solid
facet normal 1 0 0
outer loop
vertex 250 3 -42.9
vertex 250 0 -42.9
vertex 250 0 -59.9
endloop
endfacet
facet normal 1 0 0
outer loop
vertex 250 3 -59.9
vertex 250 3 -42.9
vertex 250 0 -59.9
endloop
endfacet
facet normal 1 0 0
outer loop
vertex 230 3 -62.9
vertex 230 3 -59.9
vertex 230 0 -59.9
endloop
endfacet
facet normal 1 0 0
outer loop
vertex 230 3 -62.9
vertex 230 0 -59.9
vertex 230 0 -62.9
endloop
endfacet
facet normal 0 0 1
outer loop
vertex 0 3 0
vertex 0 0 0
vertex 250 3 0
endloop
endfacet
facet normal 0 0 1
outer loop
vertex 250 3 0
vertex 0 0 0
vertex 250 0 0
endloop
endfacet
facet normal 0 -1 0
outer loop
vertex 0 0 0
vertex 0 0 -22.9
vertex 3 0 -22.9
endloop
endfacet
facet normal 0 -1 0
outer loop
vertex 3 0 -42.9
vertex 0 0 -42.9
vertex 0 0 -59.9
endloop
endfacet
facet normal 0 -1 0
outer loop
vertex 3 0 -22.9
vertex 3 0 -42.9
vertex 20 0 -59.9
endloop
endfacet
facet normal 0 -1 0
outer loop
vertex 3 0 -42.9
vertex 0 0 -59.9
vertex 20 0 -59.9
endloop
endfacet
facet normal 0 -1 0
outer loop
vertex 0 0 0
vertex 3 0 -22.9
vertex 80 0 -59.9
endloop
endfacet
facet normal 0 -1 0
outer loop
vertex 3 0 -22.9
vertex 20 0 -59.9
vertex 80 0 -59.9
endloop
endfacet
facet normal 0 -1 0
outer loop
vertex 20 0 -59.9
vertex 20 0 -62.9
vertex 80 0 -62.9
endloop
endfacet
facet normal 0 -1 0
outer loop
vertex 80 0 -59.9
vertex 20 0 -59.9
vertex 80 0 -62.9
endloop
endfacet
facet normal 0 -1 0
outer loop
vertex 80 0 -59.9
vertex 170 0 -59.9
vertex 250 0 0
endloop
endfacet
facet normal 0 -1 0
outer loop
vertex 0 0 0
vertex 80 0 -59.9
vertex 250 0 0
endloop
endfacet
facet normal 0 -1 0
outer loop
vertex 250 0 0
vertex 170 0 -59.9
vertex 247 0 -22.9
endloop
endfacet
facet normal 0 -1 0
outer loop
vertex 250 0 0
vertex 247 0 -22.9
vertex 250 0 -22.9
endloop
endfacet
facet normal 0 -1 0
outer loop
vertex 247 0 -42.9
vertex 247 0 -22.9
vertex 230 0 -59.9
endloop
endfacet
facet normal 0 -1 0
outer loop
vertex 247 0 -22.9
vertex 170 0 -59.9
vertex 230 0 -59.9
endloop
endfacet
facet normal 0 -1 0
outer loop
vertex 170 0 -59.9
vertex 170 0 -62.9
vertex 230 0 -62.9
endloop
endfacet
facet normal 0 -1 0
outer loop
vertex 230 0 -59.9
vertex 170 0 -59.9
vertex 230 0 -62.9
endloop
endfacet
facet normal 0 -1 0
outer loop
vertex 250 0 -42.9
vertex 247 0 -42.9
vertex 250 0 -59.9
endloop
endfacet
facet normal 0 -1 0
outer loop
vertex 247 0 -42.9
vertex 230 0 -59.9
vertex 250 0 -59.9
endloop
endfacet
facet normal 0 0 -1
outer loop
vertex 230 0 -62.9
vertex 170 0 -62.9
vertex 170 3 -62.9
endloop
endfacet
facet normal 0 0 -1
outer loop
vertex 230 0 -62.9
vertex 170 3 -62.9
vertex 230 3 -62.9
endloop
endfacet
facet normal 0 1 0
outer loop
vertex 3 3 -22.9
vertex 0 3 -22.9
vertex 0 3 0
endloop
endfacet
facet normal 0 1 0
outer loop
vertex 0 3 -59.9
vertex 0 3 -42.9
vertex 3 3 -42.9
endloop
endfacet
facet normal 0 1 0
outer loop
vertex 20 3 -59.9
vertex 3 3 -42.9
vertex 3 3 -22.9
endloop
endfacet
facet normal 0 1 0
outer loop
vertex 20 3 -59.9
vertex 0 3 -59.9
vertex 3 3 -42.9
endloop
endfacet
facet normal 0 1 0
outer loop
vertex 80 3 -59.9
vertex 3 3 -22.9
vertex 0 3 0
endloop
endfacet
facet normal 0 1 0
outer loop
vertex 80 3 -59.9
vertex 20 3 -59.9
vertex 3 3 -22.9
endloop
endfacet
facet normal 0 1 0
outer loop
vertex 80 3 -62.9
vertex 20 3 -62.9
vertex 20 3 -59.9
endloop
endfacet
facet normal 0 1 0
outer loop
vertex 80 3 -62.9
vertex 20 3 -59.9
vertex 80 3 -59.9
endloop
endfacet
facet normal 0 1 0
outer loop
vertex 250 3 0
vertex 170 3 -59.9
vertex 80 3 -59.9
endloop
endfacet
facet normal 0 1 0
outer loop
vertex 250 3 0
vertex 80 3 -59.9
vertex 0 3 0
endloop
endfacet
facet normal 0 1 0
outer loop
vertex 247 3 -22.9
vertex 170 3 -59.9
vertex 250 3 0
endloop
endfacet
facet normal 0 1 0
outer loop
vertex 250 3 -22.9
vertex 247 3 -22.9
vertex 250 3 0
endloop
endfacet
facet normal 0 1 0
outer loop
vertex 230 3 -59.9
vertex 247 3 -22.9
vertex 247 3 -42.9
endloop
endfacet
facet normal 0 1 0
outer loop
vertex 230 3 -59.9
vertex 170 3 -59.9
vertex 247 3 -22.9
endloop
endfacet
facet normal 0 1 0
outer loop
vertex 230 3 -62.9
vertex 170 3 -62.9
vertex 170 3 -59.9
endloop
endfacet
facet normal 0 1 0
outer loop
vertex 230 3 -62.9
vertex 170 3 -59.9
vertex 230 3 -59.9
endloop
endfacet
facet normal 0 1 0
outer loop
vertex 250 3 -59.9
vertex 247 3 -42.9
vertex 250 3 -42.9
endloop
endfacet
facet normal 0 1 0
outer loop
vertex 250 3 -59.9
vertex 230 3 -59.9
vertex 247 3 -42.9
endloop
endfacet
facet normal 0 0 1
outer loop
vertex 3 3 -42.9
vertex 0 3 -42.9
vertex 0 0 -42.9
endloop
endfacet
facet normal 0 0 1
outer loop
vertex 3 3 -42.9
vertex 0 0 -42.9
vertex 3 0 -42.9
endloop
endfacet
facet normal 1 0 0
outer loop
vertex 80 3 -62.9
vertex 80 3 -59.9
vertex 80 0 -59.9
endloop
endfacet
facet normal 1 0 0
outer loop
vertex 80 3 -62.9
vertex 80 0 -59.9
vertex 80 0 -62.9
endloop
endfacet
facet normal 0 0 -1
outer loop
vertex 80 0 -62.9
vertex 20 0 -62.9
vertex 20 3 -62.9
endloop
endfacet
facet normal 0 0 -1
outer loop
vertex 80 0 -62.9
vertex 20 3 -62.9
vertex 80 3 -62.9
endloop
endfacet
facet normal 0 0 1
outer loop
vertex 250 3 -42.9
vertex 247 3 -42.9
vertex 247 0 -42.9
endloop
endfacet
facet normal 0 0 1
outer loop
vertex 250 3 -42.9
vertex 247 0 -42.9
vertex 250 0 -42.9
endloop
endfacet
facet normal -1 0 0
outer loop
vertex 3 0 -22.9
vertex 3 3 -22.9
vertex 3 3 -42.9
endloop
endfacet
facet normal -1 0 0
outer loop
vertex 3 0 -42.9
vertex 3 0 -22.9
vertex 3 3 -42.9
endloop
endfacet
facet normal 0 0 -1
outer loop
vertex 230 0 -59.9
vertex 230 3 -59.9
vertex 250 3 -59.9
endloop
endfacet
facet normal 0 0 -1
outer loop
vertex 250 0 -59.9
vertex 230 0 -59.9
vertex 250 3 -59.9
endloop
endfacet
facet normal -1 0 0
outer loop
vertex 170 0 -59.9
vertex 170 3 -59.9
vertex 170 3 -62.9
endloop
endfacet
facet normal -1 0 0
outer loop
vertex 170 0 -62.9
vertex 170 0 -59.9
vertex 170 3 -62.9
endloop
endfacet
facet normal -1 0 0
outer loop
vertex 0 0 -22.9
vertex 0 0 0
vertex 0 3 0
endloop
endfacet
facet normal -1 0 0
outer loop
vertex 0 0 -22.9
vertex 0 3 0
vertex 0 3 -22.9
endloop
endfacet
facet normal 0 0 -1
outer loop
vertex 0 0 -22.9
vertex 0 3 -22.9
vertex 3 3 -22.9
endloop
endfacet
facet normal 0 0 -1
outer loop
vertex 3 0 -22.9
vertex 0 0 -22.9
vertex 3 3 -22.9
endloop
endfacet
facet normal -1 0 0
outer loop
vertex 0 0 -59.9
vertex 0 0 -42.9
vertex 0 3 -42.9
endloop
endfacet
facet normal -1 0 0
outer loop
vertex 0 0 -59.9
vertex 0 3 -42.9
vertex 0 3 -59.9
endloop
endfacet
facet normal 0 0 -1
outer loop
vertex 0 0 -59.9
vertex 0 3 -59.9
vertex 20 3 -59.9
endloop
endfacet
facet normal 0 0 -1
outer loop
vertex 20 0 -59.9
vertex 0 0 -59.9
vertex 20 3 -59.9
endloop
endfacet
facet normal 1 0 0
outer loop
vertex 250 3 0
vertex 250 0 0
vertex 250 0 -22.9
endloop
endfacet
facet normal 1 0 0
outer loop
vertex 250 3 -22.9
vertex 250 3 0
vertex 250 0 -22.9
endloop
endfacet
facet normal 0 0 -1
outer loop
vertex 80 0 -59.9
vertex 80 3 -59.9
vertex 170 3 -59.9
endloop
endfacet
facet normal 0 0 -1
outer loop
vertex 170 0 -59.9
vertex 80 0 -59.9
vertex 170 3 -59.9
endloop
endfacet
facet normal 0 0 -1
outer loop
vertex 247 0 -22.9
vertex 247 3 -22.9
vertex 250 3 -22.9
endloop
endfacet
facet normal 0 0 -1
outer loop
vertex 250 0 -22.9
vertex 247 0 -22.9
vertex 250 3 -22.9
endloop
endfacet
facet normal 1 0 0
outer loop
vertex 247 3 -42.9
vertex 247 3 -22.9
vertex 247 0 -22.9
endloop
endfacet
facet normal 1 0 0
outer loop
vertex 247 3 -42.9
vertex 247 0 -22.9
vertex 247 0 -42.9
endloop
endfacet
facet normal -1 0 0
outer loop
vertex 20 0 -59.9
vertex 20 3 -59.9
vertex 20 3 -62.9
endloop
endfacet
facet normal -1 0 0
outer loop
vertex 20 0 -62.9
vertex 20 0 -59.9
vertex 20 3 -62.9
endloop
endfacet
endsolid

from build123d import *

# Parameters (mm, degrees)
SKETCH1_W           = 250
SKETCH1_H           = 62.9
BOSS_EXTRUDE1_DEPTH = 3
SKETCH3_W           = 3
SKETCH3_H           = 20
CUT_EXTRUDE1_DEPTH  = 258.808863308
CUT_EXTRUDE2_REACH  = 259.809
SKETCH4_W           = 20
SKETCH4_H           = 3
CUT_EXTRUDE3_REACH  = 259.809
SKETCH5_W           = 20
SKETCH5_H           = 3
CUT_EXTRUDE4_REACH  = 259.809
SKETCH6_W           = 90
SKETCH6_H           = 3


with BuildPart() as part:
    # Sketch1 → Boss-Extrude1 (new body)
    with BuildSketch(Plane(origin=(0, 0, 0), x_dir=(1, 0, 0), z_dir=(0, 1, 0))):
        with Locations((125, 31.45)):
            Rectangle(SKETCH1_W, SKETCH1_H)
    extrude(amount=BOSS_EXTRUDE1_DEPTH)

    # Sketch3 → Cut-Extrude1 (cut, through all)
    with BuildSketch(Plane(origin=(0, 3, 0), x_dir=(1, 0, 0), z_dir=(0, 1, 0))):
        with Locations((1.5, 32.9)):
            Rectangle(SKETCH3_W, SKETCH3_H)
        with Locations((248.5, 32.9)):
            Rectangle(SKETCH3_W, SKETCH3_H)
    extrude(amount=-CUT_EXTRUDE1_DEPTH, mode=Mode.SUBTRACT)

    # Sketch4 → Cut-Extrude2 (cut, up to next)
    with BuildSketch(Plane(origin=(0, 3, 0), x_dir=(1, 0, 0), z_dir=(0, 1, 0)), mode=Mode.PRIVATE) as cut_extrude2_sk1:
        with Locations((10, 61.4)):
            Rectangle(SKETCH4_W, SKETCH4_H)
    cut_extrude2_tool1 = extrude(cut_extrude2_sk1.sketch, amount=-CUT_EXTRUDE2_REACH, mode=Mode.PRIVATE) & part.part
    add(cut_extrude2_tool1.solids().sort_by_distance((10, 3, -61.4))[0], mode=Mode.SUBTRACT)

    # Sketch5 → Cut-Extrude3 (cut, up to next)
    with BuildSketch(Plane(origin=(0, 3, 0), x_dir=(1, 0, 0), z_dir=(0, 1, 0)), mode=Mode.PRIVATE) as cut_extrude3_sk1:
        with Locations((240, 61.4)):
            Rectangle(SKETCH5_W, SKETCH5_H)
    cut_extrude3_tool1 = extrude(cut_extrude3_sk1.sketch, amount=-CUT_EXTRUDE3_REACH, mode=Mode.PRIVATE) & part.part
    add(cut_extrude3_tool1.solids().sort_by_distance((240, 3, -61.4))[0], mode=Mode.SUBTRACT)

    # Sketch6 → Cut-Extrude4 (cut, up to next)
    with BuildSketch(Plane(origin=(0, 3, 0), x_dir=(1, 0, 0), z_dir=(0, 1, 0)), mode=Mode.PRIVATE) as cut_extrude4_sk1:
        with Locations((125, 61.4)):
            Rectangle(SKETCH6_W, SKETCH6_H)
    cut_extrude4_tool1 = extrude(cut_extrude4_sk1.sketch, amount=-CUT_EXTRUDE4_REACH, mode=Mode.PRIVATE) & part.part
    add(cut_extrude4_tool1.solids().sort_by_distance((125, 3, -61.4))[0], mode=Mode.SUBTRACT)


solid = part.part
